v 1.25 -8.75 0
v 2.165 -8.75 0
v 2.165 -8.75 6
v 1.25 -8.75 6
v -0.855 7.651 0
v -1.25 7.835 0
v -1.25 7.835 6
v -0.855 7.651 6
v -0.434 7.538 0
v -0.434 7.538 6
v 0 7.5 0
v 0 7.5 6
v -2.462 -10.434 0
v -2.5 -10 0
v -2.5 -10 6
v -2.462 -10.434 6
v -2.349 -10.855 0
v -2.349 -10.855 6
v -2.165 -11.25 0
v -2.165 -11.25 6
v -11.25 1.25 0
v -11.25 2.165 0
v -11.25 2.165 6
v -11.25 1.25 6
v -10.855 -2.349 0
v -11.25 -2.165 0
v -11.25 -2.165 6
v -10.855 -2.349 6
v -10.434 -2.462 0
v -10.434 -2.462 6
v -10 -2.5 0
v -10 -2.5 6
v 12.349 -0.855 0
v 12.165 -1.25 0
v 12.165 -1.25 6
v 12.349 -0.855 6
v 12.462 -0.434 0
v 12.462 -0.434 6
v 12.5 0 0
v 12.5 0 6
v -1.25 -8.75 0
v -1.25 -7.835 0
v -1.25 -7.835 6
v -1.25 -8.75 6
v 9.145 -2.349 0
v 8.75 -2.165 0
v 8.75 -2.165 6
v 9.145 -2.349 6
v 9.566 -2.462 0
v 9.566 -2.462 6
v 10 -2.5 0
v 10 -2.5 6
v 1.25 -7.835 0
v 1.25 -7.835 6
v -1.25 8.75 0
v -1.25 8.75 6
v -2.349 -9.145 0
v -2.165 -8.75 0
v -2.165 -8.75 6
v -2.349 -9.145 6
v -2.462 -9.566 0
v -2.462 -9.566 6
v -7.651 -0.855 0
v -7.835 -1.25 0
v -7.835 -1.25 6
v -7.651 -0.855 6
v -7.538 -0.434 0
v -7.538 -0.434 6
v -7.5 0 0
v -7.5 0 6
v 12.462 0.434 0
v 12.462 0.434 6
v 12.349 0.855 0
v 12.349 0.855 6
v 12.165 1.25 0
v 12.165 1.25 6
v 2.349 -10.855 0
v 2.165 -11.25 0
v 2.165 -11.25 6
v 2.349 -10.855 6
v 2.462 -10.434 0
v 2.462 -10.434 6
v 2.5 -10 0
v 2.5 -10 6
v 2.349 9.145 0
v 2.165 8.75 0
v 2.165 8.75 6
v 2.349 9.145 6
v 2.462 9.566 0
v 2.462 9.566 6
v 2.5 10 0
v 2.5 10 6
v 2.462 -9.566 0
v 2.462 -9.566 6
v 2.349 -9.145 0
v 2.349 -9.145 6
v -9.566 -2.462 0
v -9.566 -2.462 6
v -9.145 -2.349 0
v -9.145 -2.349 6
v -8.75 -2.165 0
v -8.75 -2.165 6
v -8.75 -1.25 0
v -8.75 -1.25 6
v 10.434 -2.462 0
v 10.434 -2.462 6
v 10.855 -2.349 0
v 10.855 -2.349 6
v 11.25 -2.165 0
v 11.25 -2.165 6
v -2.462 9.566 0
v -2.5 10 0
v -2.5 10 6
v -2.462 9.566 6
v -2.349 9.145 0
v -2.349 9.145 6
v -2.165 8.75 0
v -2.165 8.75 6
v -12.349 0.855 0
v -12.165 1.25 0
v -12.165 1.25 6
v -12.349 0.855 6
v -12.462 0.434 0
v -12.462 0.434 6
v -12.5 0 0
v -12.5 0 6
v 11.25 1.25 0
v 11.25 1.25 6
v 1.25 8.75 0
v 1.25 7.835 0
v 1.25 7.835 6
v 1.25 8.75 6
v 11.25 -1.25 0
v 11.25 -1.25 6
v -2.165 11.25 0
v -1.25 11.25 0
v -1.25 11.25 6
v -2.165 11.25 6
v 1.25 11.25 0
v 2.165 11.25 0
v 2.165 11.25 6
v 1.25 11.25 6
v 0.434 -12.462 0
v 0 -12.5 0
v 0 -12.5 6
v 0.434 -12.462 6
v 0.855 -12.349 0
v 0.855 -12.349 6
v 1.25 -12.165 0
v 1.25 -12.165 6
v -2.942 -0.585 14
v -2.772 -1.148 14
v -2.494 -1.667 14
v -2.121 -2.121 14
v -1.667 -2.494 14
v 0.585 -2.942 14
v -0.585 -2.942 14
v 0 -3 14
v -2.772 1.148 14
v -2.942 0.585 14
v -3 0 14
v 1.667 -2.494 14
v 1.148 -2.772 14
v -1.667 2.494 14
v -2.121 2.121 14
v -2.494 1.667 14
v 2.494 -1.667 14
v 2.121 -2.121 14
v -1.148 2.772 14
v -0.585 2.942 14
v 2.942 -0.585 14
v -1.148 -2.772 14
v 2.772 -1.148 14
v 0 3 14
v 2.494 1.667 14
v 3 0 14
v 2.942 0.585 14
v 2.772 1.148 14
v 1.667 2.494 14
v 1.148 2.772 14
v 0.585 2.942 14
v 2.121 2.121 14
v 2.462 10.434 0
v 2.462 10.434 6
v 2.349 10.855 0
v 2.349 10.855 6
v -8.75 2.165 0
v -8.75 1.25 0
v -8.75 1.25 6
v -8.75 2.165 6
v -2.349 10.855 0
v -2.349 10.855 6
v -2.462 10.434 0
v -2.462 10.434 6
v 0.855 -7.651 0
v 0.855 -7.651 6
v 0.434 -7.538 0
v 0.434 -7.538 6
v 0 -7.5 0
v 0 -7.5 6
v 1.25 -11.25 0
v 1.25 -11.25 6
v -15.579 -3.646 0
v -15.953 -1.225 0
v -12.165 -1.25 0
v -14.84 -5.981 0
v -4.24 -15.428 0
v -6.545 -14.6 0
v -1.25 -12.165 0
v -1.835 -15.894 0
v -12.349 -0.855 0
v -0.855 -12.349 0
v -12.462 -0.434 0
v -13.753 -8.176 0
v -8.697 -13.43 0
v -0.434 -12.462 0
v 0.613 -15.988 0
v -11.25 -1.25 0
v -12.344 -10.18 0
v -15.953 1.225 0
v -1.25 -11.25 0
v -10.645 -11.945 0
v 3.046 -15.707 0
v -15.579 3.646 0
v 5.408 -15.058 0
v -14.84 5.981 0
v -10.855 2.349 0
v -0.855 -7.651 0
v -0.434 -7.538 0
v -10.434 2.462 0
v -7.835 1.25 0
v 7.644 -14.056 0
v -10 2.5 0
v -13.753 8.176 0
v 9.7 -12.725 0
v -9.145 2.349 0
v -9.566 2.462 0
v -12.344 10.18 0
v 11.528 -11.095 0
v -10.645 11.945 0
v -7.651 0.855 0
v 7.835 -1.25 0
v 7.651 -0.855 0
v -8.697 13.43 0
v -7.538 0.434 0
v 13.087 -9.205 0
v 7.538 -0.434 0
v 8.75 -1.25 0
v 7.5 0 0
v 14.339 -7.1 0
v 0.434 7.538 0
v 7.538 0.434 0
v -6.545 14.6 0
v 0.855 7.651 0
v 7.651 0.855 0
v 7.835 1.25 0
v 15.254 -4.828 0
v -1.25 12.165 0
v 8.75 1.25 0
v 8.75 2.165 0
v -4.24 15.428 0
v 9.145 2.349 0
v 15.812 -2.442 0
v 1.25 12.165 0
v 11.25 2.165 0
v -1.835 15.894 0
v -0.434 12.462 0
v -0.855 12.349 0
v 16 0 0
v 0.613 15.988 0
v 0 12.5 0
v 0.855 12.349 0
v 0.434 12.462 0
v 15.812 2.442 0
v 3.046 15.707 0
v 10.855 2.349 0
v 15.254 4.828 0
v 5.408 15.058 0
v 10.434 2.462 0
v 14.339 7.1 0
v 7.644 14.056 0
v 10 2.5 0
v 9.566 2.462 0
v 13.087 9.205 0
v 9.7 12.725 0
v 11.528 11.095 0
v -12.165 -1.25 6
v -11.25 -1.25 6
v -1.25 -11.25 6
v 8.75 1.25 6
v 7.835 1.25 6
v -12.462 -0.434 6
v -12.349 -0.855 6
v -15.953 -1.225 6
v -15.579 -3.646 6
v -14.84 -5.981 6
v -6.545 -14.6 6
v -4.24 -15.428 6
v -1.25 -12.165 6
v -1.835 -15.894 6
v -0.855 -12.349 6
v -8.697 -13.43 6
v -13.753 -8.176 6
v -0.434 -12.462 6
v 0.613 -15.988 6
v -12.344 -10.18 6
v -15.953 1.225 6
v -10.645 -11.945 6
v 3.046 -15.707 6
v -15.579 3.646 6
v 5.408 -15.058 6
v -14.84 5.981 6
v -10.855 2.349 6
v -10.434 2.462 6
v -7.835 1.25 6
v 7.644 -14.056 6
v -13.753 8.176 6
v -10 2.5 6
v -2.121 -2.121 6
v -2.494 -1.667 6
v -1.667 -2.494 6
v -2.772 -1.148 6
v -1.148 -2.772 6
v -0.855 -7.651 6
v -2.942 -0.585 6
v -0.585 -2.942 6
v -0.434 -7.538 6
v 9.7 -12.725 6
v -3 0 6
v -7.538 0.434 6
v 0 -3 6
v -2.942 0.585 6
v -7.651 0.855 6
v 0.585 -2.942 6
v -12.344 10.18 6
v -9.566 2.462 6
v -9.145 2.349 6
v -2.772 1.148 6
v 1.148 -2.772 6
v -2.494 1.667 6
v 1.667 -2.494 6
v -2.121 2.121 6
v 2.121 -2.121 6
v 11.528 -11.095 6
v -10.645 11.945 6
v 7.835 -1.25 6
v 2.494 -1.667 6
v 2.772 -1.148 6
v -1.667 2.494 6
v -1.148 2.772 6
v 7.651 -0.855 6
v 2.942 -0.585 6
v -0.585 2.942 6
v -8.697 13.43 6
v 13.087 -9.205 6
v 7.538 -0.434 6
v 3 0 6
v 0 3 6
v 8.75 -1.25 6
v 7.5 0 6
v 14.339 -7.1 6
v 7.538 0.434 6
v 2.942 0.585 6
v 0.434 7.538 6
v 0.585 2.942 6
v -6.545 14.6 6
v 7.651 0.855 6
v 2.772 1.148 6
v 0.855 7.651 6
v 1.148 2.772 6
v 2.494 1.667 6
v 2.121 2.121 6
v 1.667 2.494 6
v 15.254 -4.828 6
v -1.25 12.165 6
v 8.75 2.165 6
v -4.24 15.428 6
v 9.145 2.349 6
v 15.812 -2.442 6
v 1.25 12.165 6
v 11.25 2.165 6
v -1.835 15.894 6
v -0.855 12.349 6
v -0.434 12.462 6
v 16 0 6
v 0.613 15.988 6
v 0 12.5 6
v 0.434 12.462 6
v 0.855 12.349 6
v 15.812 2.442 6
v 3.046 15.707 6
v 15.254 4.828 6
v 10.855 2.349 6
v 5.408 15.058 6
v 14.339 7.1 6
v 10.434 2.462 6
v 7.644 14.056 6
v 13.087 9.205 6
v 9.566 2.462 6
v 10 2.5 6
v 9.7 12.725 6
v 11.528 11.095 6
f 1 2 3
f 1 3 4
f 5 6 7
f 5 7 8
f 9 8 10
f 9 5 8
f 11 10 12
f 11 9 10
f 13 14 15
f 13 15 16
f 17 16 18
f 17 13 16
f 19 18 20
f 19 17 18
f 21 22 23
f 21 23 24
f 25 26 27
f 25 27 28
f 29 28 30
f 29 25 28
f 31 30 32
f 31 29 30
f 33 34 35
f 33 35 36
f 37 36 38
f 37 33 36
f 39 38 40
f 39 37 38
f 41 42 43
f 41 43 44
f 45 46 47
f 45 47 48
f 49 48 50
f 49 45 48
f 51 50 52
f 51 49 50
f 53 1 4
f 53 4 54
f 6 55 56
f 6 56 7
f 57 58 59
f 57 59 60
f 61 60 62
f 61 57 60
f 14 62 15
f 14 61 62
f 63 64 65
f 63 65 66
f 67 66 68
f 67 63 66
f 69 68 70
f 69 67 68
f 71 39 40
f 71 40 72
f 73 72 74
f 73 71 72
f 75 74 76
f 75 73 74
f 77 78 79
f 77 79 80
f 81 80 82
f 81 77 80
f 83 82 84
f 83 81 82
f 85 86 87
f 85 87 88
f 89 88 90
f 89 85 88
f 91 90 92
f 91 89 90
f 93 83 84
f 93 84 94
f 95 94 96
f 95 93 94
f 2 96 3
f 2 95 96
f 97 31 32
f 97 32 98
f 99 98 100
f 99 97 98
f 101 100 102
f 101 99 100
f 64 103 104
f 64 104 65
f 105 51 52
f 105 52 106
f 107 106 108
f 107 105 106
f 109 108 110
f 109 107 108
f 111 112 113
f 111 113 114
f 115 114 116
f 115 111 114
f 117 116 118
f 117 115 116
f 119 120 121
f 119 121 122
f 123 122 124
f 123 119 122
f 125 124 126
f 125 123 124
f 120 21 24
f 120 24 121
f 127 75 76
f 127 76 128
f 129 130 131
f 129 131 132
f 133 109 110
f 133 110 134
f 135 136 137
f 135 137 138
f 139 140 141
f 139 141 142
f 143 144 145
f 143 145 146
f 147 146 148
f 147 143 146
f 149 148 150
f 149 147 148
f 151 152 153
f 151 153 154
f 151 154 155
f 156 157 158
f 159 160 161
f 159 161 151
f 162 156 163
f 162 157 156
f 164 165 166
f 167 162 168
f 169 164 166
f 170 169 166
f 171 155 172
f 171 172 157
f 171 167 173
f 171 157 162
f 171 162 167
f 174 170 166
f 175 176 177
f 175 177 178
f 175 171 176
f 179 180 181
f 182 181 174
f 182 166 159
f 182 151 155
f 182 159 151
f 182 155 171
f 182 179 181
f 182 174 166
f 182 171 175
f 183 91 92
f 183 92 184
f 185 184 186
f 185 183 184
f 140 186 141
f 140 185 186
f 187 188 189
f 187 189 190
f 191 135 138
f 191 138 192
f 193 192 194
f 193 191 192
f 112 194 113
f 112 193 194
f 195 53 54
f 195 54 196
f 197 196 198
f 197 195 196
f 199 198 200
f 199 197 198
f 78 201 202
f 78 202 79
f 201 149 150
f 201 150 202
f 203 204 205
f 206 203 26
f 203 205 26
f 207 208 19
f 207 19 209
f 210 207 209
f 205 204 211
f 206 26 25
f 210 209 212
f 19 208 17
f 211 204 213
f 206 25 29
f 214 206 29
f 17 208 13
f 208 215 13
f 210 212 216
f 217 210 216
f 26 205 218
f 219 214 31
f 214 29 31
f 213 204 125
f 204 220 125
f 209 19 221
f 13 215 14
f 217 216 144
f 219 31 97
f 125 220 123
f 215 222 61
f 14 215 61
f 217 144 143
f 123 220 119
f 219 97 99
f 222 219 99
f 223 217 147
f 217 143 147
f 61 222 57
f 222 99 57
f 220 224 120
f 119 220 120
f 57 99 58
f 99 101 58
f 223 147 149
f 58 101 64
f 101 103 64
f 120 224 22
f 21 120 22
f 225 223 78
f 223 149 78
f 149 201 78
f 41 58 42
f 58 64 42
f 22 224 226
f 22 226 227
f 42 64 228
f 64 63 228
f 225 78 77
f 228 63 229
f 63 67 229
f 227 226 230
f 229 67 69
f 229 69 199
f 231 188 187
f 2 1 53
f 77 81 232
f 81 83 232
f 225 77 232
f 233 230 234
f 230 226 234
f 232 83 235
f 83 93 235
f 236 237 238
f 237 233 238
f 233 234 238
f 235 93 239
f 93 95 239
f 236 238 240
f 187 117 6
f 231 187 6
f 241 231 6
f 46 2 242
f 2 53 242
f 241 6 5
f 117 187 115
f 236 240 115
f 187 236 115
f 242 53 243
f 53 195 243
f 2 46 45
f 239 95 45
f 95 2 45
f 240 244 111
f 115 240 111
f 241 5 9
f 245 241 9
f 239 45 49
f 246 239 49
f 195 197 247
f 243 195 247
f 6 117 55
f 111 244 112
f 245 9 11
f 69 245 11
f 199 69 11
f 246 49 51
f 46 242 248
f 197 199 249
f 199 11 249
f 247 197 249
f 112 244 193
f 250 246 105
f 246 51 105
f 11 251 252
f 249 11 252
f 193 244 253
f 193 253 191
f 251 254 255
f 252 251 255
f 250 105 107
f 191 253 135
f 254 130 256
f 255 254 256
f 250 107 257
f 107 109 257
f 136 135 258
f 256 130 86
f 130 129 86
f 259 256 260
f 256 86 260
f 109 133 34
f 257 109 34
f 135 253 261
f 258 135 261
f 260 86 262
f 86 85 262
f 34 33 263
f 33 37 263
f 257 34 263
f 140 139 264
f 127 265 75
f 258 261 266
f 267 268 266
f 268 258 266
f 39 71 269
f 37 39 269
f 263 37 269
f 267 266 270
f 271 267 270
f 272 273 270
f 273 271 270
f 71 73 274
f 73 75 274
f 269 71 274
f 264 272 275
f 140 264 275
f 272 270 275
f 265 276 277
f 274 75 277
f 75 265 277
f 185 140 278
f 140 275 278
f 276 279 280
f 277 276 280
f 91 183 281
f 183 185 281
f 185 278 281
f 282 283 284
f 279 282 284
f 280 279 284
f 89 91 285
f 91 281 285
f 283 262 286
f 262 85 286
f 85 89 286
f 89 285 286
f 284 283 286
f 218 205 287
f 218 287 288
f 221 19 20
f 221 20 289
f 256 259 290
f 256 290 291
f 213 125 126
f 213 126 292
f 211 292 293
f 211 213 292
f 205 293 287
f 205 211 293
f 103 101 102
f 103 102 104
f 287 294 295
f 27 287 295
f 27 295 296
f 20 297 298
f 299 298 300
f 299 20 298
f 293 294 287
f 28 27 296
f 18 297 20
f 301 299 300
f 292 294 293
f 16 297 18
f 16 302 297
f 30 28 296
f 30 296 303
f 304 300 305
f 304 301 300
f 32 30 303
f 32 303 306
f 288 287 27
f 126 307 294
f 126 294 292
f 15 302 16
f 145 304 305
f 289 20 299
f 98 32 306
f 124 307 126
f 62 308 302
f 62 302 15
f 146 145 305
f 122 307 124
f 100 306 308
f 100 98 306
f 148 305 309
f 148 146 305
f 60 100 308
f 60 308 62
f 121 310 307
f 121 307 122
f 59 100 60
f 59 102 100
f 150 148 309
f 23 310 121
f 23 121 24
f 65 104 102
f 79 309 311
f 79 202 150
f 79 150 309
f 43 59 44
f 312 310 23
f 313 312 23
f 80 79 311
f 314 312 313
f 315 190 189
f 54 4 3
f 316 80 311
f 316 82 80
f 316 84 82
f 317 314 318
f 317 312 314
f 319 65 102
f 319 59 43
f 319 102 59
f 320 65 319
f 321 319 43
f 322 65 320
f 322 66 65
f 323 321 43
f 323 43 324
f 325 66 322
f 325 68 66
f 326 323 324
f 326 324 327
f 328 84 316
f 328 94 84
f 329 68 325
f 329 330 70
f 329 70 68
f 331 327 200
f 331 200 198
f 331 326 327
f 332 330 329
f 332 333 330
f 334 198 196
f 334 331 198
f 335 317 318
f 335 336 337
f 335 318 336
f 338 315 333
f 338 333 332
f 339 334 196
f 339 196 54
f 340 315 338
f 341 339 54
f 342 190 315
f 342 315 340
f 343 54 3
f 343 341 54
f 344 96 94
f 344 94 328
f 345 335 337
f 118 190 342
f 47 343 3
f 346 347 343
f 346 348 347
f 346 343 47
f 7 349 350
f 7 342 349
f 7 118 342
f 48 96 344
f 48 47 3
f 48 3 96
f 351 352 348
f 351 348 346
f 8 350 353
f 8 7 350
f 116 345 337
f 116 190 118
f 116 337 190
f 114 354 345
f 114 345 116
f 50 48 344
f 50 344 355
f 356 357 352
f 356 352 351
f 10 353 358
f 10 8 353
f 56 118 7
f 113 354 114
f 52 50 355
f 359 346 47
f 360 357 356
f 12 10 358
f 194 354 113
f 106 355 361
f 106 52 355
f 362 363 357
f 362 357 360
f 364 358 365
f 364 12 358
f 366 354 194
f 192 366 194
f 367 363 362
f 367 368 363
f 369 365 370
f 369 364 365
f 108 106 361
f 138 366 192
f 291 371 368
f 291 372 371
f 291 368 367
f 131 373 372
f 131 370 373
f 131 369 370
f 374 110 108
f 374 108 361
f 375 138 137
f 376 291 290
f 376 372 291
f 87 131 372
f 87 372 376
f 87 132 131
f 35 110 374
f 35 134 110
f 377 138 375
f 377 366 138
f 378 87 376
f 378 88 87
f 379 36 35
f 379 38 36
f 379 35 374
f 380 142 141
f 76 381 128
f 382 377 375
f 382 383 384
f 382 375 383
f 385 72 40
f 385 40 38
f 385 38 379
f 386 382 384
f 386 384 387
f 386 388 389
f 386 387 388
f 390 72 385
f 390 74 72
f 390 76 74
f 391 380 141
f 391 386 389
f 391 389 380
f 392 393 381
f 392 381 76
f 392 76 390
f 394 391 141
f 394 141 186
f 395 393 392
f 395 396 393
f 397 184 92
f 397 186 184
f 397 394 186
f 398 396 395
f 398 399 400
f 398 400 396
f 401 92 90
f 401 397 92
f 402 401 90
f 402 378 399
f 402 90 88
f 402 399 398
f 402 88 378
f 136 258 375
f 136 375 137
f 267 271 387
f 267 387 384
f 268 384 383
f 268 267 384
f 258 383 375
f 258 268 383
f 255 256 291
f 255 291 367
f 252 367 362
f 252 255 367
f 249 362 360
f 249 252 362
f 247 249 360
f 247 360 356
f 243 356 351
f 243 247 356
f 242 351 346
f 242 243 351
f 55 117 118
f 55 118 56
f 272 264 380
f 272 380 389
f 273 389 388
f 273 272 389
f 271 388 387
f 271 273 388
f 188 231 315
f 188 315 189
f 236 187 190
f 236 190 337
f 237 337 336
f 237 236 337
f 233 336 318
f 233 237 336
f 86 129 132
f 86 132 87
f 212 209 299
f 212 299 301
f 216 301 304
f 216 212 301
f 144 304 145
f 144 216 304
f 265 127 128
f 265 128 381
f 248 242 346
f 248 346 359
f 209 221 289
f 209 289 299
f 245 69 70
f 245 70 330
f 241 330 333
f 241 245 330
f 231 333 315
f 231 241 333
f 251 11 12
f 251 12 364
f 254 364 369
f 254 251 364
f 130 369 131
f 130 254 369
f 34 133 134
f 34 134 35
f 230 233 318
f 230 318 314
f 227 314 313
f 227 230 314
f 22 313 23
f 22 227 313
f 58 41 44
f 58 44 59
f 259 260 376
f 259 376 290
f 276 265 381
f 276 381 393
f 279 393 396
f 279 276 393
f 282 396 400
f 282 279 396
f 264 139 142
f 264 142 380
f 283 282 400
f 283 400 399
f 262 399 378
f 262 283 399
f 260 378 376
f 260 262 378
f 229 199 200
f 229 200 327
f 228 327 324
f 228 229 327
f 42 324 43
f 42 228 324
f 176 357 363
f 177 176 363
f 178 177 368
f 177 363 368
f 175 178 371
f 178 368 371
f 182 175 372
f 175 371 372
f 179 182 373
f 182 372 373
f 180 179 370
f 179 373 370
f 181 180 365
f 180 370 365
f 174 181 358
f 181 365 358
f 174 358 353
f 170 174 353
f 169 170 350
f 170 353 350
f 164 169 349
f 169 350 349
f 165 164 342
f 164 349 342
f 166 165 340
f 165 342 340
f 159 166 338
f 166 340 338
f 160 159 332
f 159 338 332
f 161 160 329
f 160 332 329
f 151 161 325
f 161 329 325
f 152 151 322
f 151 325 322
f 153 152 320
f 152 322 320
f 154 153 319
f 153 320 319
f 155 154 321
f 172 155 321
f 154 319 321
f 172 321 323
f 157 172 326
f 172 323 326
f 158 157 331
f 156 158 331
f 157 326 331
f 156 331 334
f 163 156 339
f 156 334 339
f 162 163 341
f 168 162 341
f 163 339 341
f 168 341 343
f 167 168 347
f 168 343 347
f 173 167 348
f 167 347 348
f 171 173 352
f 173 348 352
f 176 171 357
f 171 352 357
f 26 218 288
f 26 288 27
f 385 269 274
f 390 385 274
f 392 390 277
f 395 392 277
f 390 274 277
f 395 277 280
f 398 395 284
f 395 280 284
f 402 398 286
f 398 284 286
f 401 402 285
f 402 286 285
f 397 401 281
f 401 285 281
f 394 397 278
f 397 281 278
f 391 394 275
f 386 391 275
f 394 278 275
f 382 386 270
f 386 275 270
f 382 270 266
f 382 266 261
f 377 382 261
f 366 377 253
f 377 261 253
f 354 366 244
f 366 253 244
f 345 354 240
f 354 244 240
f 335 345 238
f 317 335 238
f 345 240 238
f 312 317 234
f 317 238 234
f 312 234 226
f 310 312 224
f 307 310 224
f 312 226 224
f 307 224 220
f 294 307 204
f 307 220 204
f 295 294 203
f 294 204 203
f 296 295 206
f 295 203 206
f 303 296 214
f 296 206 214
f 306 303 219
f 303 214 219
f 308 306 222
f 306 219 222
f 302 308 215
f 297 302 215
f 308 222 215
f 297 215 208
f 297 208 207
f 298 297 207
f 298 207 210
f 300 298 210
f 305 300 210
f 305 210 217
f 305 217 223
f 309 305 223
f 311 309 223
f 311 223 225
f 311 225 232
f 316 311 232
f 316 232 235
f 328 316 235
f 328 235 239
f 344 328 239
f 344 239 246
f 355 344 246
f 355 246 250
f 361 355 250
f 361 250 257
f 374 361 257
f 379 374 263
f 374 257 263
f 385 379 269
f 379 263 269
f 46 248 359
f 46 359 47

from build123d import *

# Parameters (mm, degrees)
CROQUIS1_R              = 16
SALIENTE_EXTRUIR1_DEPTH = 6
CROQUIS2_R              = 3
SALIENTE_EXTRUIR2_DEPTH = 8


with BuildPart() as part:
    # Croquis1 → Saliente-Extruir1 (new body)
    with BuildSketch(Plane.XY):
        Circle(CROQUIS1_R)
        with BuildLine():
            Line((2.165063509, 11.25), (1.25, 11.25))
            Line((1.25, 11.25), (1.25, 12.165063509))
            ThreePointArc((1.25, 12.165063509), (0.647047613, 12.414814566), (0, 12.5))
            ThreePointArc((0, 12.5), (-0.647047613, 12.414814566), (-1.25, 12.165063509))
            Line((-1.25, 12.165063509), (-1.25, 11.25))
            Line((-1.25, 11.25), (-2.165063509, 11.25))
            ThreePointArc((-2.165063509, 11.25), (-2.414814566, 10.647047613), (-2.5, 10))
            ThreePointArc((-2.5, 10), (-2.414814566, 9.352952387), (-2.165063509, 8.75))
            Line((-2.165063509, 8.75), (-1.25, 8.75))
            Line((-1.25, 8.75), (-1.25, 7.834936491))
            ThreePointArc((-1.25, 7.834936491), (-0.647047613, 7.585185434), (0, 7.5))
            ThreePointArc((0, 7.5), (0.647047613, 7.585185434), (1.25, 7.834936491))
            Line((1.25, 7.834936491), (1.25, 8.75))
            Line((1.25, 8.75), (2.165063509, 8.75))
            ThreePointArc((2.165063509, 8.75), (2.414814566, 9.352952387), (2.5, 10))
            ThreePointArc((2.5, 10), (2.414814566, 10.647047613), (2.165063509, 11.25))
        make_face(mode=Mode.SUBTRACT)
        with BuildLine():
            Line((11.25, -1.25), (12.165063509, -1.25))
            ThreePointArc((12.165063509, -1.25), (12.414814566, -0.647047613), (12.5, 0))
            ThreePointArc((12.5, 0), (12.414814566, 0.647047613), (12.165063509, 1.25))
            Line((12.165063509, 1.25), (11.25, 1.25))
            Line((11.25, 1.25), (11.25, 2.165063509))
            ThreePointArc((11.25, 2.165063509), (10.647047613, 2.414814566), (10, 2.5))
            ThreePointArc((10, 2.5), (9.352952387, 2.414814566), (8.75, 2.165063509))
            Line((8.75, 2.165063509), (8.75, 1.25))
            Line((8.75, 1.25), (7.834936491, 1.25))
            ThreePointArc((7.834936491, 1.25), (7.585185434, 0.647047613), (7.5, 0))
            ThreePointArc((7.5, 0), (7.585185434, -0.647047613), (7.834936491, -1.25))
            Line((7.834936491, -1.25), (8.75, -1.25))
            Line((8.75, -1.25), (8.75, -2.165063509))
            ThreePointArc((8.75, -2.165063509), (9.352952387, -2.414814566), (10, -2.5))
            ThreePointArc((10, -2.5), (10.647047613, -2.414814566), (11.25, -2.165063509))
            Line((11.25, -2.165063509), (11.25, -1.25))
        make_face(mode=Mode.SUBTRACT)
        with BuildLine():
            Line((-1.25, -11.25), (-1.25, -12.165063509))
            ThreePointArc((-1.25, -12.165063509), (-0.647047613, -12.414814566), (0, -12.5))
            ThreePointArc((0, -12.5), (0.647047613, -12.414814566), (1.25, -12.165063509))
            Line((1.25, -12.165063509), (1.25, -11.25))
            Line((1.25, -11.25), (2.165063509, -11.25))
            ThreePointArc((2.165063509, -11.25), (2.414814566, -10.647047613), (2.5, -10))
            ThreePointArc((2.5, -10), (2.414814566, -9.352952387), (2.165063509, -8.75))
            Line((2.165063509, -8.75), (1.25, -8.75))
            Line((1.25, -8.75), (1.25, -7.834936491))
            ThreePointArc((1.25, -7.834936491), (0.647047613, -7.585185434), (0, -7.5))
            ThreePointArc((0, -7.5), (-0.647047613, -7.585185434), (-1.25, -7.834936491))
            Line((-1.25, -7.834936491), (-1.25, -8.75))
            Line((-1.25, -8.75), (-2.165063509, -8.75))
            ThreePointArc((-2.165063509, -8.75), (-2.414814566, -9.352952387), (-2.5, -10))
            ThreePointArc((-2.5, -10), (-2.414814566, -10.647047613), (-2.165063509, -11.25))
            Line((-2.165063509, -11.25), (-1.25, -11.25))
        make_face(mode=Mode.SUBTRACT)
        with BuildLine():
            Line((-11.25, 1.25), (-12.165063509, 1.25))
            ThreePointArc((-12.165063509, 1.25), (-12.414814566, 0.647047613), (-12.5, 0))
            ThreePointArc((-12.5, 0), (-12.414814566, -0.647047613), (-12.165063509, -1.25))
            Line((-12.165063509, -1.25), (-11.25, -1.25))
            Line((-11.25, -1.25), (-11.25, -2.165063509))
            ThreePointArc((-11.25, -2.165063509), (-10.647047613, -2.414814566), (-10, -2.5))
            ThreePointArc((-10, -2.5), (-9.352952387, -2.414814566), (-8.75, -2.165063509))
            Line((-8.75, -2.165063509), (-8.75, -1.25))
            Line((-8.75, -1.25), (-7.834936491, -1.25))
            ThreePointArc((-7.834936491, -1.25), (-7.585185434, -0.647047613), (-7.5, 0))
            ThreePointArc((-7.5, 0), (-7.585185434, 0.647047613), (-7.834936491, 1.25))
            Line((-7.834936491, 1.25), (-8.75, 1.25))
            Line((-8.75, 1.25), (-8.75, 2.165063509))
            ThreePointArc((-8.75, 2.165063509), (-9.352952387, 2.414814566), (-10, 2.5))
            ThreePointArc((-10, 2.5), (-10.647047613, 2.414814566), (-11.25, 2.165063509))
            Line((-11.25, 2.165063509), (-11.25, 1.25))
        make_face(mode=Mode.SUBTRACT)
    extrude(amount=SALIENTE_EXTRUIR1_DEPTH)

    # Croquis2 → Saliente-Extruir2 (add)
    with BuildSketch(Plane.XY.offset(6)):
        Circle(CROQUIS2_R)
    extrude(amount=SALIENTE_EXTRUIR2_DEPTH)


solid = part.part
